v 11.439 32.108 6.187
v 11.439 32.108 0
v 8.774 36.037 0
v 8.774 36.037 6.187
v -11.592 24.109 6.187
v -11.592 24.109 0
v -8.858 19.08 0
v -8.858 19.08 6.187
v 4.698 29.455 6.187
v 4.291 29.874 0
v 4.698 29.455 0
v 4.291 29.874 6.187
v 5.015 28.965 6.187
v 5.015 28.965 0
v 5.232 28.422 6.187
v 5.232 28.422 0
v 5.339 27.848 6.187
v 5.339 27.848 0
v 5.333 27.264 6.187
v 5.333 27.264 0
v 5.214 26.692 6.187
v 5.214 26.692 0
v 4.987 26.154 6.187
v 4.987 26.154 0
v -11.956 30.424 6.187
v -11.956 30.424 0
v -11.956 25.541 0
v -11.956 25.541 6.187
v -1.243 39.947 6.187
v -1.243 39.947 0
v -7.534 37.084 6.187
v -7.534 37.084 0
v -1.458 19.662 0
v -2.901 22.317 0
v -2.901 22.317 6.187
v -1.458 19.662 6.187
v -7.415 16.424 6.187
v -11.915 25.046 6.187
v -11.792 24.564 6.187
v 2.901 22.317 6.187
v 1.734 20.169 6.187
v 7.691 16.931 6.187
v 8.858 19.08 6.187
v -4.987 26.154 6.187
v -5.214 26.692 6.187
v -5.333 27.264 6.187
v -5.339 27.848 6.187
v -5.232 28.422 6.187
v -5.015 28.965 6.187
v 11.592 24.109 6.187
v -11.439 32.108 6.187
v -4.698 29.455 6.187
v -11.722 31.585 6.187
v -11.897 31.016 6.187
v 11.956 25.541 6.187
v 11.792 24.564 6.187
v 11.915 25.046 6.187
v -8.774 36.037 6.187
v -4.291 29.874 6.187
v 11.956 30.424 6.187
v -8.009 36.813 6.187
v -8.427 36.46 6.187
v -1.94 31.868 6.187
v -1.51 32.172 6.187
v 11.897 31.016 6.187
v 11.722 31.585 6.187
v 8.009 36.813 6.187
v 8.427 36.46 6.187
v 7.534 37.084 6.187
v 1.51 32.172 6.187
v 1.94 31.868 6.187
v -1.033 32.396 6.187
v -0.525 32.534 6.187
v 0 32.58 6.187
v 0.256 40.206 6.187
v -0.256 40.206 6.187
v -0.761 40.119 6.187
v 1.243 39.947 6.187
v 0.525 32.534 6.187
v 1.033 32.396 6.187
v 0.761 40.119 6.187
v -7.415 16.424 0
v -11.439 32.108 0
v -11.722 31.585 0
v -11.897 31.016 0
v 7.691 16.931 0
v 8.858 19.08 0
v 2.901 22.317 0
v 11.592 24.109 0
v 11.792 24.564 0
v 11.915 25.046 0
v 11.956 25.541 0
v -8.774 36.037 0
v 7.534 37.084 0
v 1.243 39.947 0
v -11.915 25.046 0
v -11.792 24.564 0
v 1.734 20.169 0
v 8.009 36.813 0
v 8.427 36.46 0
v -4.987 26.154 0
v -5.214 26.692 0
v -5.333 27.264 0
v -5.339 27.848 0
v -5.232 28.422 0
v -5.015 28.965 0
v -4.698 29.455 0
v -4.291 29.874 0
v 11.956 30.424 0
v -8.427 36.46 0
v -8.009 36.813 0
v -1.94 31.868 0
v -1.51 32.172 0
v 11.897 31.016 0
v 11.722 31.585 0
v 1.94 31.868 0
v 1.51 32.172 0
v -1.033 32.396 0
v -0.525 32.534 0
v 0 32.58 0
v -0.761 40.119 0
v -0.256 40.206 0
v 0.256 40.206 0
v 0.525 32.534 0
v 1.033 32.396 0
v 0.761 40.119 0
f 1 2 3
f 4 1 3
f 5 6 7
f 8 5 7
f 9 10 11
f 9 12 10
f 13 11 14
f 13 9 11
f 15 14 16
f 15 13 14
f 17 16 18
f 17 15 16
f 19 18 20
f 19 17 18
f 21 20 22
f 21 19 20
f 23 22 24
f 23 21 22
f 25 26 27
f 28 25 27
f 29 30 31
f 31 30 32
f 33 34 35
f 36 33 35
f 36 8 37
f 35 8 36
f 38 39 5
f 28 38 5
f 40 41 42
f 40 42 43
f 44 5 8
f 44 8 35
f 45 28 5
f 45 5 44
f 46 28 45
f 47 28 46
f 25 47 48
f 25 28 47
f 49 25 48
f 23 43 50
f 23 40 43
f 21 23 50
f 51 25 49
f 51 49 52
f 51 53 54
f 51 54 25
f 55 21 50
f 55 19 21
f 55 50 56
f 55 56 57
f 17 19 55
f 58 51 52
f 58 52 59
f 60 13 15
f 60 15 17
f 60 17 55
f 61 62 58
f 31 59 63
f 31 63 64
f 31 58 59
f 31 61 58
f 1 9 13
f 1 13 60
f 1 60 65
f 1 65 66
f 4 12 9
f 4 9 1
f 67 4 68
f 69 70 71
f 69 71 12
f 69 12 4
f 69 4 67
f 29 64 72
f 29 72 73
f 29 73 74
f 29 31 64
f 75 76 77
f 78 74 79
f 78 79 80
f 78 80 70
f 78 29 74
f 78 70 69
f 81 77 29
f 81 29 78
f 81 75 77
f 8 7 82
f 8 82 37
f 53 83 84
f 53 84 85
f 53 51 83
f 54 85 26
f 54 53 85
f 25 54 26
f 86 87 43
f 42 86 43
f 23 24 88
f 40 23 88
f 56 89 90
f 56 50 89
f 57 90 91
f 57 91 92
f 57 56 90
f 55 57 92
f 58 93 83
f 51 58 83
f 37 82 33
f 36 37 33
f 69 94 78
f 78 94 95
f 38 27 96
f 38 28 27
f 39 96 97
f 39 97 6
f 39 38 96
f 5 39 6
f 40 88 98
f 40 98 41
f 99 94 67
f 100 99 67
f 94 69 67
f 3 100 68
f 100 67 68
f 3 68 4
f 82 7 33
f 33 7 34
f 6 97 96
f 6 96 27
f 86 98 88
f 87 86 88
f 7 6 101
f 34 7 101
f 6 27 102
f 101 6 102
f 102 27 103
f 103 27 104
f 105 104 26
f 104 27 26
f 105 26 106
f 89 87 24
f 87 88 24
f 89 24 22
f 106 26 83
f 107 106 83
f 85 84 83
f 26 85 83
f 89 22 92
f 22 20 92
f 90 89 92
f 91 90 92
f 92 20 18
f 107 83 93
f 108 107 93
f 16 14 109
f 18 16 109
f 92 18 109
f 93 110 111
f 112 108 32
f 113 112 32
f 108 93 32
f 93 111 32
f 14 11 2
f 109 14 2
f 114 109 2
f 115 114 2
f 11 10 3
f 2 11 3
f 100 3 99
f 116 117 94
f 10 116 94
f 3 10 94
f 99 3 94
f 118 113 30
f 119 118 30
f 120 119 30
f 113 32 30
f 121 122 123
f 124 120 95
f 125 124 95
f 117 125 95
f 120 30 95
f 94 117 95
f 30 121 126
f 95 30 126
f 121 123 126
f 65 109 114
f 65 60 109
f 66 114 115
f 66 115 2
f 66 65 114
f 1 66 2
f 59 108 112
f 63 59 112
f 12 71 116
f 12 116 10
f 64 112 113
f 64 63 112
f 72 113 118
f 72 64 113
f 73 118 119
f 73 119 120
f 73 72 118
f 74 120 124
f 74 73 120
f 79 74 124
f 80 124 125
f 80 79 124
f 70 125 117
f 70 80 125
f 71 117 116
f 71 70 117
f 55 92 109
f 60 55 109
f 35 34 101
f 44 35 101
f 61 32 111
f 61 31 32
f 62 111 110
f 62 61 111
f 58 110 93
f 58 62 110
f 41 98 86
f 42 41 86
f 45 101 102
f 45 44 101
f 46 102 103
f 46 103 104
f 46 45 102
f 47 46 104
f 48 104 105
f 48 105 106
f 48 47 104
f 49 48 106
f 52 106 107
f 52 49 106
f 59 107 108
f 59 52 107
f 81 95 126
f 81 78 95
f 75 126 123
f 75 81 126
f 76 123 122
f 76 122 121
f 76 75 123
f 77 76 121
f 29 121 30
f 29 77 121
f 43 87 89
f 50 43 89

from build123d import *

# Parameters (mm, degrees)
F1_DEPTH = 6.1866333708
F2_R     = 3
F3_DEPTH = 2.4449569173
F4_DEPTH = 3.0221138149


with BuildPart() as f1:
    # F0 (on Top) → F1 (new body)
    with BuildSketch(Plane.XY):
        Polygon((8.3008821889, 36.7345147961), (0, 40.5132766051), (-8.3008821889, 36.7345147961), (-11.9557498605, 31.3451354549), (-11.9557498605, 24.7787649356), (-8.8584089335, 19.0796471245), (-2.9014659626, 22.3171101626), (-6.1513614195, 28.2969288261), (0, 33.5132766051), (6.1513614195, 28.2969288261), (2.9014659626, 22.3171101626), (8.8584089335, 19.0796471245), (11.9557498605, 24.7787649356), (11.9557498605, 31.3451354549), align=None)
    extrude(amount=F1_DEPTH)

    # F2
    f2_edges = [f1.edges().sort_by_distance(p)[0] for p in [
        (-11.95575, 24.778765, 3.093317),
        (0, 40.513277, 3.093317),
        (11.95575, 31.345135, 3.093317),
        (-11.95575, 31.345135, 3.093317),
        (6.151361, 28.296929, 3.093317),
        (8.300882, 36.734515, 3.093317),
        (-8.300882, 36.734515, 3.093317),
        (0, 33.513277, 3.093317),
        (11.95575, 24.778765, 3.093317),
        (-6.151361, 28.296929, 3.093317),
    ]]
    fillet(f2_edges, radius=F2_R)

    # F3 (add): a face of the model
    f3_faces = [f1.faces().sort_by_distance(p)[0] for p in [
        (5.879937448, 20.6983786435, 3.0933166854),
    ]]
    extrude(f3_faces, amount=F3_DEPTH)

    # F4 (add): a face of the model
    f4_faces = [f1.faces().sort_by_distance(p)[0] for p in [
        (-5.879937448, 20.6983786435, 3.0933166854),
    ]]
    extrude(f4_faces, amount=F4_DEPTH)


solid = f1.part
